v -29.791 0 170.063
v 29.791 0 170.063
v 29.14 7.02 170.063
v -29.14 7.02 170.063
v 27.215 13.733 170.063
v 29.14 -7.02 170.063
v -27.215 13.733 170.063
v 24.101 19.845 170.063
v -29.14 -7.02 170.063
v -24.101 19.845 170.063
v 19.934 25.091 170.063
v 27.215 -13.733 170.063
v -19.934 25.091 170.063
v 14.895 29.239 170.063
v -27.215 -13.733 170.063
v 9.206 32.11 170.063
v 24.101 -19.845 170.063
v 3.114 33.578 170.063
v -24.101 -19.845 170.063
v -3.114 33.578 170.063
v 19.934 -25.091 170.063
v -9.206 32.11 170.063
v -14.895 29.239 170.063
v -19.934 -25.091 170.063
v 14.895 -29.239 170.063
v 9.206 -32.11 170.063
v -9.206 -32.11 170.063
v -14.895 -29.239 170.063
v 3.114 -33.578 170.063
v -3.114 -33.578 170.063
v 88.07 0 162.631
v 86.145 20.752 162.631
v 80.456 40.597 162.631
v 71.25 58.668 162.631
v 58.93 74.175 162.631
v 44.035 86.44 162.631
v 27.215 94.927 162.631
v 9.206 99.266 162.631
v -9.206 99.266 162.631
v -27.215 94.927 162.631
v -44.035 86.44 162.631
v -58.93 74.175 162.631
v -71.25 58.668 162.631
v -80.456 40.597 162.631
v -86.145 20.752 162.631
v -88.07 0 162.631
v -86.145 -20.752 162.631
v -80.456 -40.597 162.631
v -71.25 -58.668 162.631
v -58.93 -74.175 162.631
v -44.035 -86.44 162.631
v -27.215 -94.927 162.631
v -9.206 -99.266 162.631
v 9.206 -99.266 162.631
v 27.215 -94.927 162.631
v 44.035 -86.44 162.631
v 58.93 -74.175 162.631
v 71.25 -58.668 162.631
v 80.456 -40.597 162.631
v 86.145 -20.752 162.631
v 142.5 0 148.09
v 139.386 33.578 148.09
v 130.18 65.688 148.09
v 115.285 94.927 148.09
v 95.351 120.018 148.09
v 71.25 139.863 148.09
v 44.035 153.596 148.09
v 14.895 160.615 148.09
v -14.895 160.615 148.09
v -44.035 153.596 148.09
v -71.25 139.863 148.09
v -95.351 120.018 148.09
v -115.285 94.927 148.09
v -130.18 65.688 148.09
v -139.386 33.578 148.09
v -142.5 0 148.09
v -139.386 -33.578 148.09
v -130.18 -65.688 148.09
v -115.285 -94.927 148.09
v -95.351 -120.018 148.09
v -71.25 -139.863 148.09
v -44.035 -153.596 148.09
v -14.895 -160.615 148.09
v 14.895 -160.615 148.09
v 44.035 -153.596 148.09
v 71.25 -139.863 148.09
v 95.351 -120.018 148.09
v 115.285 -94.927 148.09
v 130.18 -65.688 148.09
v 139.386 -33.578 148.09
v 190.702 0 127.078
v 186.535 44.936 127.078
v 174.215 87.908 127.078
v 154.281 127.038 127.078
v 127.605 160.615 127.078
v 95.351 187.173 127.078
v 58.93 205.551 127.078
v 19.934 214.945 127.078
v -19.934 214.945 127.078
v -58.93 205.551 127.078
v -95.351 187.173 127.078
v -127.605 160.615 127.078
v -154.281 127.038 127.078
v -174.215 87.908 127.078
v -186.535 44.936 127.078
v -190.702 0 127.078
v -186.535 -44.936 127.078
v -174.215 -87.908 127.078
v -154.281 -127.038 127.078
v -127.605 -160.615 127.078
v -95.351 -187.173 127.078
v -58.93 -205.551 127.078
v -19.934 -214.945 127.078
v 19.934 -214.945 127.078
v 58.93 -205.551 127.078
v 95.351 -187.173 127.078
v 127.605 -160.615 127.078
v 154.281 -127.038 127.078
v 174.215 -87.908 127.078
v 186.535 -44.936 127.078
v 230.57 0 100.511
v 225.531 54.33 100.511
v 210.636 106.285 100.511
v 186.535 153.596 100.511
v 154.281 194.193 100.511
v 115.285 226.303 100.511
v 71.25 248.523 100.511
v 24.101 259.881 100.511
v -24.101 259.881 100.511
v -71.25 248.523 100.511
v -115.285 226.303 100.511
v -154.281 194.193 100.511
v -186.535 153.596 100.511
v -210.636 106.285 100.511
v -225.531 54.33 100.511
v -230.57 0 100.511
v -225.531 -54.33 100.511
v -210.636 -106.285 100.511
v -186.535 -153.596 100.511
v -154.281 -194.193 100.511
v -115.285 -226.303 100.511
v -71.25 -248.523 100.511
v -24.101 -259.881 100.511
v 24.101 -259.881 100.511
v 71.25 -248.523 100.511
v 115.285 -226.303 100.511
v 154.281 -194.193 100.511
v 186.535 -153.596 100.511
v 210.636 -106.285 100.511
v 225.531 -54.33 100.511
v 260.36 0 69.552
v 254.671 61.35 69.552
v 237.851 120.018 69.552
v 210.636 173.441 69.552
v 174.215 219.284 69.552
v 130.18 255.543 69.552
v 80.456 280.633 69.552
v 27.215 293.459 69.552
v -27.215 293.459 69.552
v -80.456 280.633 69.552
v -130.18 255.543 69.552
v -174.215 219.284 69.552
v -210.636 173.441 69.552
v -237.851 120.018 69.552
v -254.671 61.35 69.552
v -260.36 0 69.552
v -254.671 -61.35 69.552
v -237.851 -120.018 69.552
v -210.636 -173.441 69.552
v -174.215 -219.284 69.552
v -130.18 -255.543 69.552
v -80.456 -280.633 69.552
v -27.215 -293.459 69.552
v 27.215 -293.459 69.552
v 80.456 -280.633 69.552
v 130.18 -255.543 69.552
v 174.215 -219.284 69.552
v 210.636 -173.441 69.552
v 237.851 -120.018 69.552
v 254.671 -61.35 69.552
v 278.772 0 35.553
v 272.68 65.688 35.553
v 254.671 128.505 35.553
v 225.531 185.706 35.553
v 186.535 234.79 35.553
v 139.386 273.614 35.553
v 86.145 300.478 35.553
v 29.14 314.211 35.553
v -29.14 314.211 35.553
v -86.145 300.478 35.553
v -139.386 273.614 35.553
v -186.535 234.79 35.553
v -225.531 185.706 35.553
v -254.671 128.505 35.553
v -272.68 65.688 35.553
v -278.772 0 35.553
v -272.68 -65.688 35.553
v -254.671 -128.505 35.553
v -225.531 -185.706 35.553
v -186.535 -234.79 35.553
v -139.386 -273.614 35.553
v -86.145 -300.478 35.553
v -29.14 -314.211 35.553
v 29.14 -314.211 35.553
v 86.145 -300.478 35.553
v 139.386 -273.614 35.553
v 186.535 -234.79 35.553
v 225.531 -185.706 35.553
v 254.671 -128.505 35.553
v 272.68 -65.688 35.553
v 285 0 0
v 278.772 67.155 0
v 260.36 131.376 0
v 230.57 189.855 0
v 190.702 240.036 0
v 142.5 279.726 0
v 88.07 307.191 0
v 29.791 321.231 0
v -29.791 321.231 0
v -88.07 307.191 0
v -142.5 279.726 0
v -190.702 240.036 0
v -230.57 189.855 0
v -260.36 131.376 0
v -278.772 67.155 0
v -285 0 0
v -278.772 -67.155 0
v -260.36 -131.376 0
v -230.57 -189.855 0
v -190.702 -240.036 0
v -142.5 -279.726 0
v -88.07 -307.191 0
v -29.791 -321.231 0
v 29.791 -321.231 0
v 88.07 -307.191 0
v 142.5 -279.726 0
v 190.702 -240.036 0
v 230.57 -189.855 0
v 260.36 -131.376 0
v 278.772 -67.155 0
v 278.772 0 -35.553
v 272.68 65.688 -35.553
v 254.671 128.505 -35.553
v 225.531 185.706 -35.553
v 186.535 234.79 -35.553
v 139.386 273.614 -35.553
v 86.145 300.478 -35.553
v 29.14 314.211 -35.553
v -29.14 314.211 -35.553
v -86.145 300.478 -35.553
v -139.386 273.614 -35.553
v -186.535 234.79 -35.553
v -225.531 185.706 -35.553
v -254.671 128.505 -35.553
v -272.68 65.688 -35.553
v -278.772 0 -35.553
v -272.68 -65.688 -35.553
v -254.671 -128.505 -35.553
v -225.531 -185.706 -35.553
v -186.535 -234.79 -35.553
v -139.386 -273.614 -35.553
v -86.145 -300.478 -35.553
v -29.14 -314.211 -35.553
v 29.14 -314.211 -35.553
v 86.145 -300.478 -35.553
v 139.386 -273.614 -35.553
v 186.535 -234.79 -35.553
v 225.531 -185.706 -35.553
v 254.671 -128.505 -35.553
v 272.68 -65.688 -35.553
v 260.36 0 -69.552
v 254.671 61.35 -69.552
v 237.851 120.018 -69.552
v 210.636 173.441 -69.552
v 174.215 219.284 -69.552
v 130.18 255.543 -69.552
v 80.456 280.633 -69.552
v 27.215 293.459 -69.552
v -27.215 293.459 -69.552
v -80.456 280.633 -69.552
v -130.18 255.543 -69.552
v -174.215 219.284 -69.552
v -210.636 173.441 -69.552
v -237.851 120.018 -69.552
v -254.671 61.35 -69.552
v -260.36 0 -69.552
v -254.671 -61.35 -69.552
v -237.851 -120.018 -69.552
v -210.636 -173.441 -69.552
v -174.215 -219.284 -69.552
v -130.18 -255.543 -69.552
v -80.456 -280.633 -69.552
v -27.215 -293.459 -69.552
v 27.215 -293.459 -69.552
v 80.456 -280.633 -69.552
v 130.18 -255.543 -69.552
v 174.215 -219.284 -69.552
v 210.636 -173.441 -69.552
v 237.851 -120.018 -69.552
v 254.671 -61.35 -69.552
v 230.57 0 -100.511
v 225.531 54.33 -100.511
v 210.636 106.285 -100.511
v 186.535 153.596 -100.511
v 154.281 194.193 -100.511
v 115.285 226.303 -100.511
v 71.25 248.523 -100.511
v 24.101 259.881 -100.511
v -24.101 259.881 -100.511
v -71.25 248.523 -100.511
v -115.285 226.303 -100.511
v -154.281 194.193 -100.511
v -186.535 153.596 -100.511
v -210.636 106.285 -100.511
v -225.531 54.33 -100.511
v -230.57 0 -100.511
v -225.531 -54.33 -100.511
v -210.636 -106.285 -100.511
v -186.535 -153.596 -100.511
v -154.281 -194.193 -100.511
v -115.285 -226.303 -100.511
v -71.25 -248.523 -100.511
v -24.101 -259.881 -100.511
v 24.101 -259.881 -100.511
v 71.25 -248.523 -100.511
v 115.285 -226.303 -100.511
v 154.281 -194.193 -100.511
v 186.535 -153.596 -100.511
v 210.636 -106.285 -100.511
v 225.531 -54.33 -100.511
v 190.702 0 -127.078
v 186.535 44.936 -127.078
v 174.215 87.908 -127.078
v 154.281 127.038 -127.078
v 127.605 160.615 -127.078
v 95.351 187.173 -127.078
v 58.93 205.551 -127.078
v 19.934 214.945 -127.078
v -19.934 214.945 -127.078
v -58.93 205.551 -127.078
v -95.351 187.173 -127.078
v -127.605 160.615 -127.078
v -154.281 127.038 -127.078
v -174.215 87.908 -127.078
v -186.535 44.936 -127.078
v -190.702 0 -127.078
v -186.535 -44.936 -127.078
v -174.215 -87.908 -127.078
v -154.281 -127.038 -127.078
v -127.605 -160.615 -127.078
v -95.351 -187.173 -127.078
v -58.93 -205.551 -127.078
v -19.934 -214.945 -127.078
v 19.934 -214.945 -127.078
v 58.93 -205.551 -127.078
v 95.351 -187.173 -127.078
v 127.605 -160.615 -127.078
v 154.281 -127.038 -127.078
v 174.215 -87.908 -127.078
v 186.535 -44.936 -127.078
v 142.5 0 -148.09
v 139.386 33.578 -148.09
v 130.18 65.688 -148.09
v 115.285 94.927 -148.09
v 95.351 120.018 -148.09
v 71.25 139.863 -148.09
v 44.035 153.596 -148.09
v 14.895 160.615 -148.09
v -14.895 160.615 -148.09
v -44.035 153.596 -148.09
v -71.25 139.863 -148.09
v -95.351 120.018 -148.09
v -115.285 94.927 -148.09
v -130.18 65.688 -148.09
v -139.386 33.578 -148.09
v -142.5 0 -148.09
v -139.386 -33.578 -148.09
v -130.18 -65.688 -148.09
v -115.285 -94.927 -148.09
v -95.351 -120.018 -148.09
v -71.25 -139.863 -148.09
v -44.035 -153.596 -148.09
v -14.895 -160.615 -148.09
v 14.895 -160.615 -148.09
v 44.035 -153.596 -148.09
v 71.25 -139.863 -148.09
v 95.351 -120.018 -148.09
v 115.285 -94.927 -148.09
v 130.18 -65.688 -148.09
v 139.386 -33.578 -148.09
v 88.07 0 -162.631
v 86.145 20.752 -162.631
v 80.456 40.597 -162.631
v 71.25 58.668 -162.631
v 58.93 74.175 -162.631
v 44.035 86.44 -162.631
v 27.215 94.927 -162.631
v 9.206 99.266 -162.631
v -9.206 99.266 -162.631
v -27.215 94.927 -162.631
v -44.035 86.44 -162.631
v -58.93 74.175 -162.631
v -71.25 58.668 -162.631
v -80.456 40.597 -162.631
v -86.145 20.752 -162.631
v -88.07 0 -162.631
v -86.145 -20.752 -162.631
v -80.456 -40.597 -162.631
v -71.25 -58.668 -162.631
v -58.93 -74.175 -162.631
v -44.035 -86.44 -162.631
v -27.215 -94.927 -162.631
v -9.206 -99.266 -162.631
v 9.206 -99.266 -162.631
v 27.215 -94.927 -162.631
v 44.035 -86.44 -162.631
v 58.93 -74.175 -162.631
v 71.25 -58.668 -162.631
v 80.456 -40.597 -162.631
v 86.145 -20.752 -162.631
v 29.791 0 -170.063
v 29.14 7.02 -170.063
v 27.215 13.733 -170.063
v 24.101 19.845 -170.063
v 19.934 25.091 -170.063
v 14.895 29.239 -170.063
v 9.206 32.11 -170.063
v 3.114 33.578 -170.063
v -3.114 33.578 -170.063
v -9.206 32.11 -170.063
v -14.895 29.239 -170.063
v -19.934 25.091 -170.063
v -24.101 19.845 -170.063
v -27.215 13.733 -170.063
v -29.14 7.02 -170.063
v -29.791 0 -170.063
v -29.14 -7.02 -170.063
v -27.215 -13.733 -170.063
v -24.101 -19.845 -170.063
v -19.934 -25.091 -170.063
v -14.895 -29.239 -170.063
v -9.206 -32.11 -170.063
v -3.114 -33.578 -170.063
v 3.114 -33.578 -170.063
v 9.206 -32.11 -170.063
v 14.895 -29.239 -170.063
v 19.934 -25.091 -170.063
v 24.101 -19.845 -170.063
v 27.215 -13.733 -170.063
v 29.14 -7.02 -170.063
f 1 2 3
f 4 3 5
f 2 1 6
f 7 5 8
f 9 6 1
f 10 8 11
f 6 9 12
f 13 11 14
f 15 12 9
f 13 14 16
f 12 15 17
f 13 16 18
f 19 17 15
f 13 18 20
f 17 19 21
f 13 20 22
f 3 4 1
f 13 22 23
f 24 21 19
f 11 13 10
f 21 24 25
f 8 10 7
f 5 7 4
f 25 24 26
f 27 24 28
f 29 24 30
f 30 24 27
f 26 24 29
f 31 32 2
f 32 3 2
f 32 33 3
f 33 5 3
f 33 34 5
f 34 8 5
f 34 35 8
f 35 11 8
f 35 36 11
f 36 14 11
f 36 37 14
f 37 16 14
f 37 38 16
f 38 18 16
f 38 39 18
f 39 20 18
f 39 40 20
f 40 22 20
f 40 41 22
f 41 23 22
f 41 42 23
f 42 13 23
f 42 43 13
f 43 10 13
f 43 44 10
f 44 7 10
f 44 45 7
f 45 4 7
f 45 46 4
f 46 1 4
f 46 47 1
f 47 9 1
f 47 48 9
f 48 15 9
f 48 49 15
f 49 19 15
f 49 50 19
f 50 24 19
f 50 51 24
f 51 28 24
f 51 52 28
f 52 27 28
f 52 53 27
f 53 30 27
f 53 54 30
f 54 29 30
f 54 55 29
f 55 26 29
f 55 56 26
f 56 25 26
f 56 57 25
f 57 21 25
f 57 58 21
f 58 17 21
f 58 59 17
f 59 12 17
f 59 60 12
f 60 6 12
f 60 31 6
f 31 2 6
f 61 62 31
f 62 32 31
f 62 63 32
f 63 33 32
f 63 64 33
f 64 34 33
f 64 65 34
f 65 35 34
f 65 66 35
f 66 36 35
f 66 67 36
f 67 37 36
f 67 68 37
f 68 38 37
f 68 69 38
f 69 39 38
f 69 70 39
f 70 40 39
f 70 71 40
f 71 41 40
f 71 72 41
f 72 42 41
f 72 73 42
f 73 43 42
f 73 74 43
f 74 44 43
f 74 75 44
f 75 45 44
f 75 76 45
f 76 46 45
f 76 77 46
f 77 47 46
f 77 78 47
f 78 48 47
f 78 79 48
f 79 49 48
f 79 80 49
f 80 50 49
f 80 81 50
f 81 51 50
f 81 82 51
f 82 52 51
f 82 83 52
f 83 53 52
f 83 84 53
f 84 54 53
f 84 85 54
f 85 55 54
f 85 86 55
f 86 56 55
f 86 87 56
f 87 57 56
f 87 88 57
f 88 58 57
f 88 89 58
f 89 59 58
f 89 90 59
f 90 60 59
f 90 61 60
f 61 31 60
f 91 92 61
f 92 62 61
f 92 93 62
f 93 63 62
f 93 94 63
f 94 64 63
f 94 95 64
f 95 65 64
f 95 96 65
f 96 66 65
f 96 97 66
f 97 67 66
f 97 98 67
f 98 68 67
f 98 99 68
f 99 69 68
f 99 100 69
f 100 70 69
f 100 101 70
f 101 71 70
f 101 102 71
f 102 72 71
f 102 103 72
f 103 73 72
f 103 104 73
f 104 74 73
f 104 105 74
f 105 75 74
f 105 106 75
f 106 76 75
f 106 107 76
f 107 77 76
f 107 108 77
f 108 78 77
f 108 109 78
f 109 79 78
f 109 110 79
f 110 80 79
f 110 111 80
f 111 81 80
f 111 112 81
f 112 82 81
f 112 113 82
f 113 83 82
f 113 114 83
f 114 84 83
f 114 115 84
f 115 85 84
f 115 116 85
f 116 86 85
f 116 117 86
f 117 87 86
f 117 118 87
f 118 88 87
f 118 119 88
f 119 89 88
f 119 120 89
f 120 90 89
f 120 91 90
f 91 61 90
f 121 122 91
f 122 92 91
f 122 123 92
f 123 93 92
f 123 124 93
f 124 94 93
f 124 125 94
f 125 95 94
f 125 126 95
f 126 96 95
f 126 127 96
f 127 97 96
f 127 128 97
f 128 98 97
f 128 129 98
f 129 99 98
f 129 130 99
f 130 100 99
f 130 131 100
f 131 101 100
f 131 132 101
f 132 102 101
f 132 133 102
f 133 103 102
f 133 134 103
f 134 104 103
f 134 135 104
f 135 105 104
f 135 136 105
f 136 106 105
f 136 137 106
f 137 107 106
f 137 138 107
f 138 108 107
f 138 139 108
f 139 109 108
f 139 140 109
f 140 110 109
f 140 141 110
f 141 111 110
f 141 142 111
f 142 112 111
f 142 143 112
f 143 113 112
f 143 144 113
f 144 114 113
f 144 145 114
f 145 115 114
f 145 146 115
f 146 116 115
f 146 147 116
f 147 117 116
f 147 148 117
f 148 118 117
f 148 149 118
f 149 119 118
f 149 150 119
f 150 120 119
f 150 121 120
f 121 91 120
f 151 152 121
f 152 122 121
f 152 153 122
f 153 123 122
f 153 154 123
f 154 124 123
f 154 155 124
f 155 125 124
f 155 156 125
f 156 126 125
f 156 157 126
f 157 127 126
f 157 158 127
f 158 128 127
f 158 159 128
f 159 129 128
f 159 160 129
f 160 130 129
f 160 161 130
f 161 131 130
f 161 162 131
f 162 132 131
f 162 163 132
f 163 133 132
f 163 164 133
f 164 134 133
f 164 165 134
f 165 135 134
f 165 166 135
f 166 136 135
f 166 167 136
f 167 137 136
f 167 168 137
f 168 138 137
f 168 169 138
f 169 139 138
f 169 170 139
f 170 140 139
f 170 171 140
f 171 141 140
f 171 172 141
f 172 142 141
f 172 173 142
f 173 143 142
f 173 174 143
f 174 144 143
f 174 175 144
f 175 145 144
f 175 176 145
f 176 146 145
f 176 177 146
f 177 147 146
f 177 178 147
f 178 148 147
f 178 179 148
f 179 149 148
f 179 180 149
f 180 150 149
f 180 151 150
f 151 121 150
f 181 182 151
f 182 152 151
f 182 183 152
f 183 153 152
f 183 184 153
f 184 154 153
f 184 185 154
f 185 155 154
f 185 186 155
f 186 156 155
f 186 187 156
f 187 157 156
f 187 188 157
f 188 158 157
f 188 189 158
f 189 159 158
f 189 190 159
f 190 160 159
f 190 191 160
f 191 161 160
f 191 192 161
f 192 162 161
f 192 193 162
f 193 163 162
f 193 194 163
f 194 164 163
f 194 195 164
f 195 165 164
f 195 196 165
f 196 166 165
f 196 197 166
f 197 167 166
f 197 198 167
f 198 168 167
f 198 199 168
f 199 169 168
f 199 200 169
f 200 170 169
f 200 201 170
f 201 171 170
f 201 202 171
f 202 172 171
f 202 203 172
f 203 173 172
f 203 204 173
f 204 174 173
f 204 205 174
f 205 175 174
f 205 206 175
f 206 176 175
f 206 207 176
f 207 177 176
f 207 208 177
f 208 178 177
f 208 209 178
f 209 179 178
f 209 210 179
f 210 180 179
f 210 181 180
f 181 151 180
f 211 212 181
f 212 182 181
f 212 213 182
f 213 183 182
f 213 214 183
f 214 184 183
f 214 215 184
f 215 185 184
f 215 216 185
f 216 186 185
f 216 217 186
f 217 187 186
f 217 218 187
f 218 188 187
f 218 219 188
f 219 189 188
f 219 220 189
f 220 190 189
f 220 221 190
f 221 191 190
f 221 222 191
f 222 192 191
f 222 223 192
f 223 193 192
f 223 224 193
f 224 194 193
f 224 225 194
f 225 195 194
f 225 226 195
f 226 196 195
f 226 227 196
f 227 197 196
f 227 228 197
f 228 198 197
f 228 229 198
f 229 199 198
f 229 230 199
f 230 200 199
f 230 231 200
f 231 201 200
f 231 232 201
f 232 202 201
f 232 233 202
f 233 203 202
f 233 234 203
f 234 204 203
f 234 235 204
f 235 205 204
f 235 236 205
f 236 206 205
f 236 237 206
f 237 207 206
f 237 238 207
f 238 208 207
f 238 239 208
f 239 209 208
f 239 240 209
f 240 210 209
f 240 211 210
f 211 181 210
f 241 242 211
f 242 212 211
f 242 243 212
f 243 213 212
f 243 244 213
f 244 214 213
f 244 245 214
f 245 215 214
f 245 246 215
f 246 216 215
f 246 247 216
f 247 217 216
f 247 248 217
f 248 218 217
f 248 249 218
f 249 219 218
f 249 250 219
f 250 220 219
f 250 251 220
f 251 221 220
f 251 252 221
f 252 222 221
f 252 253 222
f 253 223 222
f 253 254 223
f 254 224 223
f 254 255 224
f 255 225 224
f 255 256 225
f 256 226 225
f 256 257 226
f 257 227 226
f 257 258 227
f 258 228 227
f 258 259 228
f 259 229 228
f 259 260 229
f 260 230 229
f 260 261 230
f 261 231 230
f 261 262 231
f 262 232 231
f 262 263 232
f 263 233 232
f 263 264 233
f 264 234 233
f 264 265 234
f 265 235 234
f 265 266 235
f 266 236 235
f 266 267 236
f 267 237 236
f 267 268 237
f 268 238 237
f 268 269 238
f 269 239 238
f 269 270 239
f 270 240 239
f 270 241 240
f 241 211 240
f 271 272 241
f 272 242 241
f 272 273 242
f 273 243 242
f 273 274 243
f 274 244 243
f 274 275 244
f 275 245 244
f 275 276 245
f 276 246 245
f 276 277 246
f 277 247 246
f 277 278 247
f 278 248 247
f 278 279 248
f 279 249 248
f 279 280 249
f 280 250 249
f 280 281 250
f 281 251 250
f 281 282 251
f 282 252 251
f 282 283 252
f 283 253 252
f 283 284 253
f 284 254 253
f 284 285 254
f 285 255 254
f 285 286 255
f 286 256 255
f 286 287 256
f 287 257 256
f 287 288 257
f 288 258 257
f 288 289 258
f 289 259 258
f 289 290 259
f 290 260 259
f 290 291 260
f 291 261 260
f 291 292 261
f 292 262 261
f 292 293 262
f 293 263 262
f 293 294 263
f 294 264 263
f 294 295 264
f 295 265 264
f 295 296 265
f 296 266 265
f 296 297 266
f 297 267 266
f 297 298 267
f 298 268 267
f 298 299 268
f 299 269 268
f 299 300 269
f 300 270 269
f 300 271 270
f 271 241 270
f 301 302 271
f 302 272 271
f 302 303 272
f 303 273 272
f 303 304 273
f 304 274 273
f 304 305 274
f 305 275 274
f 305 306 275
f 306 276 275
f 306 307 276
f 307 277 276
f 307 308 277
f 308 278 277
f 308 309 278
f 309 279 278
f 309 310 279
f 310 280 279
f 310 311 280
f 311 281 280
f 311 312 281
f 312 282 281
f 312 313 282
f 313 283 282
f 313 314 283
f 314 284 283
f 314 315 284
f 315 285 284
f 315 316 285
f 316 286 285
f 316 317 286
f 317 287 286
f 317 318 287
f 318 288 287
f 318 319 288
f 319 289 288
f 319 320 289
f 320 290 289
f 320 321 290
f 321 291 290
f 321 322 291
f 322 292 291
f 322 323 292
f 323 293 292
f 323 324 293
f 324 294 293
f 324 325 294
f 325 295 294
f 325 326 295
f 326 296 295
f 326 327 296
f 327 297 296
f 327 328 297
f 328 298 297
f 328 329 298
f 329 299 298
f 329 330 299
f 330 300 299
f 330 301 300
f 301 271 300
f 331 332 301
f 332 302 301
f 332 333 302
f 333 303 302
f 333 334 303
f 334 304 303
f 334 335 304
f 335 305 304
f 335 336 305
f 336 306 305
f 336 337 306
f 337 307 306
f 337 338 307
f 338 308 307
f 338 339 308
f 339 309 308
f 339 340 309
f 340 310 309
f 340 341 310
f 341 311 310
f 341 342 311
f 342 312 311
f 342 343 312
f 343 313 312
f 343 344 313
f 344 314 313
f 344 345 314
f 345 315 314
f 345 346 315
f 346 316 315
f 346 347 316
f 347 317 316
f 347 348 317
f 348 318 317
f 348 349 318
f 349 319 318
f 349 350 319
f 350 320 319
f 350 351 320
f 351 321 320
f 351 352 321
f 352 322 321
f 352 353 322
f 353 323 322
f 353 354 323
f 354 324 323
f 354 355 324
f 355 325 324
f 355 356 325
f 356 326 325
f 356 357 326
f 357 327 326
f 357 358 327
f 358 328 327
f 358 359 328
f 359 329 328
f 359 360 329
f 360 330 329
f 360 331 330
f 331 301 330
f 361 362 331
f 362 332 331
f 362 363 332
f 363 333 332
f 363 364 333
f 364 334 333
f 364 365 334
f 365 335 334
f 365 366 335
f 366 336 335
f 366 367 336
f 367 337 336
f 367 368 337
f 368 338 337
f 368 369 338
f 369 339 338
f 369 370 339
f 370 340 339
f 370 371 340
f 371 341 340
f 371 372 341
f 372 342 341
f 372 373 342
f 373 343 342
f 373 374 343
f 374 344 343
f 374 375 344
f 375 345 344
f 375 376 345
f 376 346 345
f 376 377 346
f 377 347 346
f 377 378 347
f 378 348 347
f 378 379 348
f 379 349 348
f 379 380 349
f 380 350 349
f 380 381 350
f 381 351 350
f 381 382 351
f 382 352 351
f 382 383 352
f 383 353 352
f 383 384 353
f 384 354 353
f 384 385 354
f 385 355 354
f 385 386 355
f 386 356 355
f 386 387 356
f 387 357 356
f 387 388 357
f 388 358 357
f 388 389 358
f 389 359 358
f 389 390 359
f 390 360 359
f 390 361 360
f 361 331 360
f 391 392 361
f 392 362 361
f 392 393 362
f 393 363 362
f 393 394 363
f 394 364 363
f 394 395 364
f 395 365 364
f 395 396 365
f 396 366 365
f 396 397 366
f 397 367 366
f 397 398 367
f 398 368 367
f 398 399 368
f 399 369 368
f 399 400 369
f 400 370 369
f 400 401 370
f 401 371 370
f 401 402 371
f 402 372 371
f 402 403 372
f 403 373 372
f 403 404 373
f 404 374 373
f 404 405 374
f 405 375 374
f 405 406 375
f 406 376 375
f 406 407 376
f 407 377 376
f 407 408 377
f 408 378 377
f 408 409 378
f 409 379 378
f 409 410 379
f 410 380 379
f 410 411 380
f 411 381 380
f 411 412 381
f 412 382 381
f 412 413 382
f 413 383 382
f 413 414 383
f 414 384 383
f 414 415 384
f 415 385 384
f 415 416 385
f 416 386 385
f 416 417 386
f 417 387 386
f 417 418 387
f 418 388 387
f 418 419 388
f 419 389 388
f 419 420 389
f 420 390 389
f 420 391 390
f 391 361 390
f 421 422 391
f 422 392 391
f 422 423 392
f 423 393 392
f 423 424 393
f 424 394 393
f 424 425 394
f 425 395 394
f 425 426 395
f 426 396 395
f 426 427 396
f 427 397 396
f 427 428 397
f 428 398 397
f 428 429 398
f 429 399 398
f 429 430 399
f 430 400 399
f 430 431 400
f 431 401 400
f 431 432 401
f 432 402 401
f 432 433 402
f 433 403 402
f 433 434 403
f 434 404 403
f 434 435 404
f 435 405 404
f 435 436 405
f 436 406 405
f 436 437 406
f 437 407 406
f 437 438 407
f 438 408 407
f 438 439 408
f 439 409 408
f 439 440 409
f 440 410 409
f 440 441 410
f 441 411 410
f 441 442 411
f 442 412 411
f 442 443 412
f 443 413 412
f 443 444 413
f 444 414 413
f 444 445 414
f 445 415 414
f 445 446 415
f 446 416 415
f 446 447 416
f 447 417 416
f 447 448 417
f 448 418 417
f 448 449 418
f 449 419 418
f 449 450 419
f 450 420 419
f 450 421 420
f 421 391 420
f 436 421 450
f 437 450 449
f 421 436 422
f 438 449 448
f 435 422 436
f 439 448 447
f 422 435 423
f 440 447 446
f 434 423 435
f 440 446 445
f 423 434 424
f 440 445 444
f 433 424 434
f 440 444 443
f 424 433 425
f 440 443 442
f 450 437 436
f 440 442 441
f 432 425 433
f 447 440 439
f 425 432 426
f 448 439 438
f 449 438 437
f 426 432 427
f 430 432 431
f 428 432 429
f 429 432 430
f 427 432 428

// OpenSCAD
// Generated by SolidPython 1.0.1 on 2020-07-29 00:46:52


scale(v = [15, 17, 9]) {
	sphere(r = 19);
}
/***********************************************
*********      SolidPython code:      **********
************************************************
 
# import packages: SolidPython
from solid import *
from solid.utils import *
from itertools import chain, combinations, permutations


class Resize:

    def __init__(self, scad_file):
        self.scad_file = scad_file
        #self.scad_file = import_scad(scad_file)
        # cone/cylinder param:
        self.r1 = 0
        self.r2 = 0
        self.h = 0
        # rectangular prism param:
        self.w = 0
        self.l = 0
        # ellipse param:
        self.r = 0

    # import OpenScad code (file name corresponds to shape)


    # classify shape + parameters
    def assign(self, param1, param2, param3):
        if self.scad_file == 'cone.scad':
            self.r1 = param1
            self.r2 = param2
            self.h = param3
        elif self.scad_file == 'cylinder.scad':
            self.r1 = param1
            self.r2 = param2
            self.h = param3
        elif self.scad_file == 'rectangularPrism.scad':
            self.h = param1
            self.l = param2
            self.w = param3
        else:
            self.r = param1
            self.h = param2

    # resize parameters
    def iterate(self):
        x = range(3, 20, 2)
        i = 1
        if self.scad_file == 'cone.scad':
            tempList = list(permutations(x, 2))
            for temp in tempList:
                param1 = temp[0]
                param2 = temp[1]
                filepath = 'produced_scad_files/' + 'cone' + str(param1) + '_' + str(param2) + '_' + '.scad'
                scad_render_to_file(cylinder(h=param1, r1=param2, r2=0), filepath)

        elif self.scad_file == 'cylinder.scad':
            tempList = list(permutations(x, 3))
            for temp in tempList:
                param1 = temp[0]
                param2 = temp[1]
                filepath = 'produced_scad_files/' + 'cylinder' + str(param1) + '_' + str(param2) + '_' + '.scad'
                scad_render_to_file(cylinder(h=param1, r1=param2, r2=param2), filepath)

        elif self.scad_file == 'rectangularPrism.scad':
            tempList = list(permutations(x, 3))
            for temp in tempList:
                param1 = temp[0]
                param2 = temp[1]
                param3 = temp[2]
                filepath = 'produced_scad_files/' + 'rectangularPrism' + str(param1) + '_' + str(param2) + '_' + str(
                    param3) + '.scad'
                scad_render_to_file(cube(size=(param1, param2, param3)), filepath)

        elif self.scad_file == 'ellipse.scad':
            tempList = list(permutations(x, 4))
            for temp in tempList:
                param1 = temp[0]
                param2 = temp[1]
                param3 = temp[2]
                param4 = temp[3]
                filepath = 'produced_scad_files/' + 'ellipse' + str(param1) + '_' + str(param2) + '_' + str(param3) + '_' + str(param4) + '.scad'
                scad_render_to_file(scale([param1, param2, param3])(sphere(r=param4)), filepath)

    def render_to_scadfile(self):
        scad_render_to_file(scad, 'example.scad') 
 
************************************************/
